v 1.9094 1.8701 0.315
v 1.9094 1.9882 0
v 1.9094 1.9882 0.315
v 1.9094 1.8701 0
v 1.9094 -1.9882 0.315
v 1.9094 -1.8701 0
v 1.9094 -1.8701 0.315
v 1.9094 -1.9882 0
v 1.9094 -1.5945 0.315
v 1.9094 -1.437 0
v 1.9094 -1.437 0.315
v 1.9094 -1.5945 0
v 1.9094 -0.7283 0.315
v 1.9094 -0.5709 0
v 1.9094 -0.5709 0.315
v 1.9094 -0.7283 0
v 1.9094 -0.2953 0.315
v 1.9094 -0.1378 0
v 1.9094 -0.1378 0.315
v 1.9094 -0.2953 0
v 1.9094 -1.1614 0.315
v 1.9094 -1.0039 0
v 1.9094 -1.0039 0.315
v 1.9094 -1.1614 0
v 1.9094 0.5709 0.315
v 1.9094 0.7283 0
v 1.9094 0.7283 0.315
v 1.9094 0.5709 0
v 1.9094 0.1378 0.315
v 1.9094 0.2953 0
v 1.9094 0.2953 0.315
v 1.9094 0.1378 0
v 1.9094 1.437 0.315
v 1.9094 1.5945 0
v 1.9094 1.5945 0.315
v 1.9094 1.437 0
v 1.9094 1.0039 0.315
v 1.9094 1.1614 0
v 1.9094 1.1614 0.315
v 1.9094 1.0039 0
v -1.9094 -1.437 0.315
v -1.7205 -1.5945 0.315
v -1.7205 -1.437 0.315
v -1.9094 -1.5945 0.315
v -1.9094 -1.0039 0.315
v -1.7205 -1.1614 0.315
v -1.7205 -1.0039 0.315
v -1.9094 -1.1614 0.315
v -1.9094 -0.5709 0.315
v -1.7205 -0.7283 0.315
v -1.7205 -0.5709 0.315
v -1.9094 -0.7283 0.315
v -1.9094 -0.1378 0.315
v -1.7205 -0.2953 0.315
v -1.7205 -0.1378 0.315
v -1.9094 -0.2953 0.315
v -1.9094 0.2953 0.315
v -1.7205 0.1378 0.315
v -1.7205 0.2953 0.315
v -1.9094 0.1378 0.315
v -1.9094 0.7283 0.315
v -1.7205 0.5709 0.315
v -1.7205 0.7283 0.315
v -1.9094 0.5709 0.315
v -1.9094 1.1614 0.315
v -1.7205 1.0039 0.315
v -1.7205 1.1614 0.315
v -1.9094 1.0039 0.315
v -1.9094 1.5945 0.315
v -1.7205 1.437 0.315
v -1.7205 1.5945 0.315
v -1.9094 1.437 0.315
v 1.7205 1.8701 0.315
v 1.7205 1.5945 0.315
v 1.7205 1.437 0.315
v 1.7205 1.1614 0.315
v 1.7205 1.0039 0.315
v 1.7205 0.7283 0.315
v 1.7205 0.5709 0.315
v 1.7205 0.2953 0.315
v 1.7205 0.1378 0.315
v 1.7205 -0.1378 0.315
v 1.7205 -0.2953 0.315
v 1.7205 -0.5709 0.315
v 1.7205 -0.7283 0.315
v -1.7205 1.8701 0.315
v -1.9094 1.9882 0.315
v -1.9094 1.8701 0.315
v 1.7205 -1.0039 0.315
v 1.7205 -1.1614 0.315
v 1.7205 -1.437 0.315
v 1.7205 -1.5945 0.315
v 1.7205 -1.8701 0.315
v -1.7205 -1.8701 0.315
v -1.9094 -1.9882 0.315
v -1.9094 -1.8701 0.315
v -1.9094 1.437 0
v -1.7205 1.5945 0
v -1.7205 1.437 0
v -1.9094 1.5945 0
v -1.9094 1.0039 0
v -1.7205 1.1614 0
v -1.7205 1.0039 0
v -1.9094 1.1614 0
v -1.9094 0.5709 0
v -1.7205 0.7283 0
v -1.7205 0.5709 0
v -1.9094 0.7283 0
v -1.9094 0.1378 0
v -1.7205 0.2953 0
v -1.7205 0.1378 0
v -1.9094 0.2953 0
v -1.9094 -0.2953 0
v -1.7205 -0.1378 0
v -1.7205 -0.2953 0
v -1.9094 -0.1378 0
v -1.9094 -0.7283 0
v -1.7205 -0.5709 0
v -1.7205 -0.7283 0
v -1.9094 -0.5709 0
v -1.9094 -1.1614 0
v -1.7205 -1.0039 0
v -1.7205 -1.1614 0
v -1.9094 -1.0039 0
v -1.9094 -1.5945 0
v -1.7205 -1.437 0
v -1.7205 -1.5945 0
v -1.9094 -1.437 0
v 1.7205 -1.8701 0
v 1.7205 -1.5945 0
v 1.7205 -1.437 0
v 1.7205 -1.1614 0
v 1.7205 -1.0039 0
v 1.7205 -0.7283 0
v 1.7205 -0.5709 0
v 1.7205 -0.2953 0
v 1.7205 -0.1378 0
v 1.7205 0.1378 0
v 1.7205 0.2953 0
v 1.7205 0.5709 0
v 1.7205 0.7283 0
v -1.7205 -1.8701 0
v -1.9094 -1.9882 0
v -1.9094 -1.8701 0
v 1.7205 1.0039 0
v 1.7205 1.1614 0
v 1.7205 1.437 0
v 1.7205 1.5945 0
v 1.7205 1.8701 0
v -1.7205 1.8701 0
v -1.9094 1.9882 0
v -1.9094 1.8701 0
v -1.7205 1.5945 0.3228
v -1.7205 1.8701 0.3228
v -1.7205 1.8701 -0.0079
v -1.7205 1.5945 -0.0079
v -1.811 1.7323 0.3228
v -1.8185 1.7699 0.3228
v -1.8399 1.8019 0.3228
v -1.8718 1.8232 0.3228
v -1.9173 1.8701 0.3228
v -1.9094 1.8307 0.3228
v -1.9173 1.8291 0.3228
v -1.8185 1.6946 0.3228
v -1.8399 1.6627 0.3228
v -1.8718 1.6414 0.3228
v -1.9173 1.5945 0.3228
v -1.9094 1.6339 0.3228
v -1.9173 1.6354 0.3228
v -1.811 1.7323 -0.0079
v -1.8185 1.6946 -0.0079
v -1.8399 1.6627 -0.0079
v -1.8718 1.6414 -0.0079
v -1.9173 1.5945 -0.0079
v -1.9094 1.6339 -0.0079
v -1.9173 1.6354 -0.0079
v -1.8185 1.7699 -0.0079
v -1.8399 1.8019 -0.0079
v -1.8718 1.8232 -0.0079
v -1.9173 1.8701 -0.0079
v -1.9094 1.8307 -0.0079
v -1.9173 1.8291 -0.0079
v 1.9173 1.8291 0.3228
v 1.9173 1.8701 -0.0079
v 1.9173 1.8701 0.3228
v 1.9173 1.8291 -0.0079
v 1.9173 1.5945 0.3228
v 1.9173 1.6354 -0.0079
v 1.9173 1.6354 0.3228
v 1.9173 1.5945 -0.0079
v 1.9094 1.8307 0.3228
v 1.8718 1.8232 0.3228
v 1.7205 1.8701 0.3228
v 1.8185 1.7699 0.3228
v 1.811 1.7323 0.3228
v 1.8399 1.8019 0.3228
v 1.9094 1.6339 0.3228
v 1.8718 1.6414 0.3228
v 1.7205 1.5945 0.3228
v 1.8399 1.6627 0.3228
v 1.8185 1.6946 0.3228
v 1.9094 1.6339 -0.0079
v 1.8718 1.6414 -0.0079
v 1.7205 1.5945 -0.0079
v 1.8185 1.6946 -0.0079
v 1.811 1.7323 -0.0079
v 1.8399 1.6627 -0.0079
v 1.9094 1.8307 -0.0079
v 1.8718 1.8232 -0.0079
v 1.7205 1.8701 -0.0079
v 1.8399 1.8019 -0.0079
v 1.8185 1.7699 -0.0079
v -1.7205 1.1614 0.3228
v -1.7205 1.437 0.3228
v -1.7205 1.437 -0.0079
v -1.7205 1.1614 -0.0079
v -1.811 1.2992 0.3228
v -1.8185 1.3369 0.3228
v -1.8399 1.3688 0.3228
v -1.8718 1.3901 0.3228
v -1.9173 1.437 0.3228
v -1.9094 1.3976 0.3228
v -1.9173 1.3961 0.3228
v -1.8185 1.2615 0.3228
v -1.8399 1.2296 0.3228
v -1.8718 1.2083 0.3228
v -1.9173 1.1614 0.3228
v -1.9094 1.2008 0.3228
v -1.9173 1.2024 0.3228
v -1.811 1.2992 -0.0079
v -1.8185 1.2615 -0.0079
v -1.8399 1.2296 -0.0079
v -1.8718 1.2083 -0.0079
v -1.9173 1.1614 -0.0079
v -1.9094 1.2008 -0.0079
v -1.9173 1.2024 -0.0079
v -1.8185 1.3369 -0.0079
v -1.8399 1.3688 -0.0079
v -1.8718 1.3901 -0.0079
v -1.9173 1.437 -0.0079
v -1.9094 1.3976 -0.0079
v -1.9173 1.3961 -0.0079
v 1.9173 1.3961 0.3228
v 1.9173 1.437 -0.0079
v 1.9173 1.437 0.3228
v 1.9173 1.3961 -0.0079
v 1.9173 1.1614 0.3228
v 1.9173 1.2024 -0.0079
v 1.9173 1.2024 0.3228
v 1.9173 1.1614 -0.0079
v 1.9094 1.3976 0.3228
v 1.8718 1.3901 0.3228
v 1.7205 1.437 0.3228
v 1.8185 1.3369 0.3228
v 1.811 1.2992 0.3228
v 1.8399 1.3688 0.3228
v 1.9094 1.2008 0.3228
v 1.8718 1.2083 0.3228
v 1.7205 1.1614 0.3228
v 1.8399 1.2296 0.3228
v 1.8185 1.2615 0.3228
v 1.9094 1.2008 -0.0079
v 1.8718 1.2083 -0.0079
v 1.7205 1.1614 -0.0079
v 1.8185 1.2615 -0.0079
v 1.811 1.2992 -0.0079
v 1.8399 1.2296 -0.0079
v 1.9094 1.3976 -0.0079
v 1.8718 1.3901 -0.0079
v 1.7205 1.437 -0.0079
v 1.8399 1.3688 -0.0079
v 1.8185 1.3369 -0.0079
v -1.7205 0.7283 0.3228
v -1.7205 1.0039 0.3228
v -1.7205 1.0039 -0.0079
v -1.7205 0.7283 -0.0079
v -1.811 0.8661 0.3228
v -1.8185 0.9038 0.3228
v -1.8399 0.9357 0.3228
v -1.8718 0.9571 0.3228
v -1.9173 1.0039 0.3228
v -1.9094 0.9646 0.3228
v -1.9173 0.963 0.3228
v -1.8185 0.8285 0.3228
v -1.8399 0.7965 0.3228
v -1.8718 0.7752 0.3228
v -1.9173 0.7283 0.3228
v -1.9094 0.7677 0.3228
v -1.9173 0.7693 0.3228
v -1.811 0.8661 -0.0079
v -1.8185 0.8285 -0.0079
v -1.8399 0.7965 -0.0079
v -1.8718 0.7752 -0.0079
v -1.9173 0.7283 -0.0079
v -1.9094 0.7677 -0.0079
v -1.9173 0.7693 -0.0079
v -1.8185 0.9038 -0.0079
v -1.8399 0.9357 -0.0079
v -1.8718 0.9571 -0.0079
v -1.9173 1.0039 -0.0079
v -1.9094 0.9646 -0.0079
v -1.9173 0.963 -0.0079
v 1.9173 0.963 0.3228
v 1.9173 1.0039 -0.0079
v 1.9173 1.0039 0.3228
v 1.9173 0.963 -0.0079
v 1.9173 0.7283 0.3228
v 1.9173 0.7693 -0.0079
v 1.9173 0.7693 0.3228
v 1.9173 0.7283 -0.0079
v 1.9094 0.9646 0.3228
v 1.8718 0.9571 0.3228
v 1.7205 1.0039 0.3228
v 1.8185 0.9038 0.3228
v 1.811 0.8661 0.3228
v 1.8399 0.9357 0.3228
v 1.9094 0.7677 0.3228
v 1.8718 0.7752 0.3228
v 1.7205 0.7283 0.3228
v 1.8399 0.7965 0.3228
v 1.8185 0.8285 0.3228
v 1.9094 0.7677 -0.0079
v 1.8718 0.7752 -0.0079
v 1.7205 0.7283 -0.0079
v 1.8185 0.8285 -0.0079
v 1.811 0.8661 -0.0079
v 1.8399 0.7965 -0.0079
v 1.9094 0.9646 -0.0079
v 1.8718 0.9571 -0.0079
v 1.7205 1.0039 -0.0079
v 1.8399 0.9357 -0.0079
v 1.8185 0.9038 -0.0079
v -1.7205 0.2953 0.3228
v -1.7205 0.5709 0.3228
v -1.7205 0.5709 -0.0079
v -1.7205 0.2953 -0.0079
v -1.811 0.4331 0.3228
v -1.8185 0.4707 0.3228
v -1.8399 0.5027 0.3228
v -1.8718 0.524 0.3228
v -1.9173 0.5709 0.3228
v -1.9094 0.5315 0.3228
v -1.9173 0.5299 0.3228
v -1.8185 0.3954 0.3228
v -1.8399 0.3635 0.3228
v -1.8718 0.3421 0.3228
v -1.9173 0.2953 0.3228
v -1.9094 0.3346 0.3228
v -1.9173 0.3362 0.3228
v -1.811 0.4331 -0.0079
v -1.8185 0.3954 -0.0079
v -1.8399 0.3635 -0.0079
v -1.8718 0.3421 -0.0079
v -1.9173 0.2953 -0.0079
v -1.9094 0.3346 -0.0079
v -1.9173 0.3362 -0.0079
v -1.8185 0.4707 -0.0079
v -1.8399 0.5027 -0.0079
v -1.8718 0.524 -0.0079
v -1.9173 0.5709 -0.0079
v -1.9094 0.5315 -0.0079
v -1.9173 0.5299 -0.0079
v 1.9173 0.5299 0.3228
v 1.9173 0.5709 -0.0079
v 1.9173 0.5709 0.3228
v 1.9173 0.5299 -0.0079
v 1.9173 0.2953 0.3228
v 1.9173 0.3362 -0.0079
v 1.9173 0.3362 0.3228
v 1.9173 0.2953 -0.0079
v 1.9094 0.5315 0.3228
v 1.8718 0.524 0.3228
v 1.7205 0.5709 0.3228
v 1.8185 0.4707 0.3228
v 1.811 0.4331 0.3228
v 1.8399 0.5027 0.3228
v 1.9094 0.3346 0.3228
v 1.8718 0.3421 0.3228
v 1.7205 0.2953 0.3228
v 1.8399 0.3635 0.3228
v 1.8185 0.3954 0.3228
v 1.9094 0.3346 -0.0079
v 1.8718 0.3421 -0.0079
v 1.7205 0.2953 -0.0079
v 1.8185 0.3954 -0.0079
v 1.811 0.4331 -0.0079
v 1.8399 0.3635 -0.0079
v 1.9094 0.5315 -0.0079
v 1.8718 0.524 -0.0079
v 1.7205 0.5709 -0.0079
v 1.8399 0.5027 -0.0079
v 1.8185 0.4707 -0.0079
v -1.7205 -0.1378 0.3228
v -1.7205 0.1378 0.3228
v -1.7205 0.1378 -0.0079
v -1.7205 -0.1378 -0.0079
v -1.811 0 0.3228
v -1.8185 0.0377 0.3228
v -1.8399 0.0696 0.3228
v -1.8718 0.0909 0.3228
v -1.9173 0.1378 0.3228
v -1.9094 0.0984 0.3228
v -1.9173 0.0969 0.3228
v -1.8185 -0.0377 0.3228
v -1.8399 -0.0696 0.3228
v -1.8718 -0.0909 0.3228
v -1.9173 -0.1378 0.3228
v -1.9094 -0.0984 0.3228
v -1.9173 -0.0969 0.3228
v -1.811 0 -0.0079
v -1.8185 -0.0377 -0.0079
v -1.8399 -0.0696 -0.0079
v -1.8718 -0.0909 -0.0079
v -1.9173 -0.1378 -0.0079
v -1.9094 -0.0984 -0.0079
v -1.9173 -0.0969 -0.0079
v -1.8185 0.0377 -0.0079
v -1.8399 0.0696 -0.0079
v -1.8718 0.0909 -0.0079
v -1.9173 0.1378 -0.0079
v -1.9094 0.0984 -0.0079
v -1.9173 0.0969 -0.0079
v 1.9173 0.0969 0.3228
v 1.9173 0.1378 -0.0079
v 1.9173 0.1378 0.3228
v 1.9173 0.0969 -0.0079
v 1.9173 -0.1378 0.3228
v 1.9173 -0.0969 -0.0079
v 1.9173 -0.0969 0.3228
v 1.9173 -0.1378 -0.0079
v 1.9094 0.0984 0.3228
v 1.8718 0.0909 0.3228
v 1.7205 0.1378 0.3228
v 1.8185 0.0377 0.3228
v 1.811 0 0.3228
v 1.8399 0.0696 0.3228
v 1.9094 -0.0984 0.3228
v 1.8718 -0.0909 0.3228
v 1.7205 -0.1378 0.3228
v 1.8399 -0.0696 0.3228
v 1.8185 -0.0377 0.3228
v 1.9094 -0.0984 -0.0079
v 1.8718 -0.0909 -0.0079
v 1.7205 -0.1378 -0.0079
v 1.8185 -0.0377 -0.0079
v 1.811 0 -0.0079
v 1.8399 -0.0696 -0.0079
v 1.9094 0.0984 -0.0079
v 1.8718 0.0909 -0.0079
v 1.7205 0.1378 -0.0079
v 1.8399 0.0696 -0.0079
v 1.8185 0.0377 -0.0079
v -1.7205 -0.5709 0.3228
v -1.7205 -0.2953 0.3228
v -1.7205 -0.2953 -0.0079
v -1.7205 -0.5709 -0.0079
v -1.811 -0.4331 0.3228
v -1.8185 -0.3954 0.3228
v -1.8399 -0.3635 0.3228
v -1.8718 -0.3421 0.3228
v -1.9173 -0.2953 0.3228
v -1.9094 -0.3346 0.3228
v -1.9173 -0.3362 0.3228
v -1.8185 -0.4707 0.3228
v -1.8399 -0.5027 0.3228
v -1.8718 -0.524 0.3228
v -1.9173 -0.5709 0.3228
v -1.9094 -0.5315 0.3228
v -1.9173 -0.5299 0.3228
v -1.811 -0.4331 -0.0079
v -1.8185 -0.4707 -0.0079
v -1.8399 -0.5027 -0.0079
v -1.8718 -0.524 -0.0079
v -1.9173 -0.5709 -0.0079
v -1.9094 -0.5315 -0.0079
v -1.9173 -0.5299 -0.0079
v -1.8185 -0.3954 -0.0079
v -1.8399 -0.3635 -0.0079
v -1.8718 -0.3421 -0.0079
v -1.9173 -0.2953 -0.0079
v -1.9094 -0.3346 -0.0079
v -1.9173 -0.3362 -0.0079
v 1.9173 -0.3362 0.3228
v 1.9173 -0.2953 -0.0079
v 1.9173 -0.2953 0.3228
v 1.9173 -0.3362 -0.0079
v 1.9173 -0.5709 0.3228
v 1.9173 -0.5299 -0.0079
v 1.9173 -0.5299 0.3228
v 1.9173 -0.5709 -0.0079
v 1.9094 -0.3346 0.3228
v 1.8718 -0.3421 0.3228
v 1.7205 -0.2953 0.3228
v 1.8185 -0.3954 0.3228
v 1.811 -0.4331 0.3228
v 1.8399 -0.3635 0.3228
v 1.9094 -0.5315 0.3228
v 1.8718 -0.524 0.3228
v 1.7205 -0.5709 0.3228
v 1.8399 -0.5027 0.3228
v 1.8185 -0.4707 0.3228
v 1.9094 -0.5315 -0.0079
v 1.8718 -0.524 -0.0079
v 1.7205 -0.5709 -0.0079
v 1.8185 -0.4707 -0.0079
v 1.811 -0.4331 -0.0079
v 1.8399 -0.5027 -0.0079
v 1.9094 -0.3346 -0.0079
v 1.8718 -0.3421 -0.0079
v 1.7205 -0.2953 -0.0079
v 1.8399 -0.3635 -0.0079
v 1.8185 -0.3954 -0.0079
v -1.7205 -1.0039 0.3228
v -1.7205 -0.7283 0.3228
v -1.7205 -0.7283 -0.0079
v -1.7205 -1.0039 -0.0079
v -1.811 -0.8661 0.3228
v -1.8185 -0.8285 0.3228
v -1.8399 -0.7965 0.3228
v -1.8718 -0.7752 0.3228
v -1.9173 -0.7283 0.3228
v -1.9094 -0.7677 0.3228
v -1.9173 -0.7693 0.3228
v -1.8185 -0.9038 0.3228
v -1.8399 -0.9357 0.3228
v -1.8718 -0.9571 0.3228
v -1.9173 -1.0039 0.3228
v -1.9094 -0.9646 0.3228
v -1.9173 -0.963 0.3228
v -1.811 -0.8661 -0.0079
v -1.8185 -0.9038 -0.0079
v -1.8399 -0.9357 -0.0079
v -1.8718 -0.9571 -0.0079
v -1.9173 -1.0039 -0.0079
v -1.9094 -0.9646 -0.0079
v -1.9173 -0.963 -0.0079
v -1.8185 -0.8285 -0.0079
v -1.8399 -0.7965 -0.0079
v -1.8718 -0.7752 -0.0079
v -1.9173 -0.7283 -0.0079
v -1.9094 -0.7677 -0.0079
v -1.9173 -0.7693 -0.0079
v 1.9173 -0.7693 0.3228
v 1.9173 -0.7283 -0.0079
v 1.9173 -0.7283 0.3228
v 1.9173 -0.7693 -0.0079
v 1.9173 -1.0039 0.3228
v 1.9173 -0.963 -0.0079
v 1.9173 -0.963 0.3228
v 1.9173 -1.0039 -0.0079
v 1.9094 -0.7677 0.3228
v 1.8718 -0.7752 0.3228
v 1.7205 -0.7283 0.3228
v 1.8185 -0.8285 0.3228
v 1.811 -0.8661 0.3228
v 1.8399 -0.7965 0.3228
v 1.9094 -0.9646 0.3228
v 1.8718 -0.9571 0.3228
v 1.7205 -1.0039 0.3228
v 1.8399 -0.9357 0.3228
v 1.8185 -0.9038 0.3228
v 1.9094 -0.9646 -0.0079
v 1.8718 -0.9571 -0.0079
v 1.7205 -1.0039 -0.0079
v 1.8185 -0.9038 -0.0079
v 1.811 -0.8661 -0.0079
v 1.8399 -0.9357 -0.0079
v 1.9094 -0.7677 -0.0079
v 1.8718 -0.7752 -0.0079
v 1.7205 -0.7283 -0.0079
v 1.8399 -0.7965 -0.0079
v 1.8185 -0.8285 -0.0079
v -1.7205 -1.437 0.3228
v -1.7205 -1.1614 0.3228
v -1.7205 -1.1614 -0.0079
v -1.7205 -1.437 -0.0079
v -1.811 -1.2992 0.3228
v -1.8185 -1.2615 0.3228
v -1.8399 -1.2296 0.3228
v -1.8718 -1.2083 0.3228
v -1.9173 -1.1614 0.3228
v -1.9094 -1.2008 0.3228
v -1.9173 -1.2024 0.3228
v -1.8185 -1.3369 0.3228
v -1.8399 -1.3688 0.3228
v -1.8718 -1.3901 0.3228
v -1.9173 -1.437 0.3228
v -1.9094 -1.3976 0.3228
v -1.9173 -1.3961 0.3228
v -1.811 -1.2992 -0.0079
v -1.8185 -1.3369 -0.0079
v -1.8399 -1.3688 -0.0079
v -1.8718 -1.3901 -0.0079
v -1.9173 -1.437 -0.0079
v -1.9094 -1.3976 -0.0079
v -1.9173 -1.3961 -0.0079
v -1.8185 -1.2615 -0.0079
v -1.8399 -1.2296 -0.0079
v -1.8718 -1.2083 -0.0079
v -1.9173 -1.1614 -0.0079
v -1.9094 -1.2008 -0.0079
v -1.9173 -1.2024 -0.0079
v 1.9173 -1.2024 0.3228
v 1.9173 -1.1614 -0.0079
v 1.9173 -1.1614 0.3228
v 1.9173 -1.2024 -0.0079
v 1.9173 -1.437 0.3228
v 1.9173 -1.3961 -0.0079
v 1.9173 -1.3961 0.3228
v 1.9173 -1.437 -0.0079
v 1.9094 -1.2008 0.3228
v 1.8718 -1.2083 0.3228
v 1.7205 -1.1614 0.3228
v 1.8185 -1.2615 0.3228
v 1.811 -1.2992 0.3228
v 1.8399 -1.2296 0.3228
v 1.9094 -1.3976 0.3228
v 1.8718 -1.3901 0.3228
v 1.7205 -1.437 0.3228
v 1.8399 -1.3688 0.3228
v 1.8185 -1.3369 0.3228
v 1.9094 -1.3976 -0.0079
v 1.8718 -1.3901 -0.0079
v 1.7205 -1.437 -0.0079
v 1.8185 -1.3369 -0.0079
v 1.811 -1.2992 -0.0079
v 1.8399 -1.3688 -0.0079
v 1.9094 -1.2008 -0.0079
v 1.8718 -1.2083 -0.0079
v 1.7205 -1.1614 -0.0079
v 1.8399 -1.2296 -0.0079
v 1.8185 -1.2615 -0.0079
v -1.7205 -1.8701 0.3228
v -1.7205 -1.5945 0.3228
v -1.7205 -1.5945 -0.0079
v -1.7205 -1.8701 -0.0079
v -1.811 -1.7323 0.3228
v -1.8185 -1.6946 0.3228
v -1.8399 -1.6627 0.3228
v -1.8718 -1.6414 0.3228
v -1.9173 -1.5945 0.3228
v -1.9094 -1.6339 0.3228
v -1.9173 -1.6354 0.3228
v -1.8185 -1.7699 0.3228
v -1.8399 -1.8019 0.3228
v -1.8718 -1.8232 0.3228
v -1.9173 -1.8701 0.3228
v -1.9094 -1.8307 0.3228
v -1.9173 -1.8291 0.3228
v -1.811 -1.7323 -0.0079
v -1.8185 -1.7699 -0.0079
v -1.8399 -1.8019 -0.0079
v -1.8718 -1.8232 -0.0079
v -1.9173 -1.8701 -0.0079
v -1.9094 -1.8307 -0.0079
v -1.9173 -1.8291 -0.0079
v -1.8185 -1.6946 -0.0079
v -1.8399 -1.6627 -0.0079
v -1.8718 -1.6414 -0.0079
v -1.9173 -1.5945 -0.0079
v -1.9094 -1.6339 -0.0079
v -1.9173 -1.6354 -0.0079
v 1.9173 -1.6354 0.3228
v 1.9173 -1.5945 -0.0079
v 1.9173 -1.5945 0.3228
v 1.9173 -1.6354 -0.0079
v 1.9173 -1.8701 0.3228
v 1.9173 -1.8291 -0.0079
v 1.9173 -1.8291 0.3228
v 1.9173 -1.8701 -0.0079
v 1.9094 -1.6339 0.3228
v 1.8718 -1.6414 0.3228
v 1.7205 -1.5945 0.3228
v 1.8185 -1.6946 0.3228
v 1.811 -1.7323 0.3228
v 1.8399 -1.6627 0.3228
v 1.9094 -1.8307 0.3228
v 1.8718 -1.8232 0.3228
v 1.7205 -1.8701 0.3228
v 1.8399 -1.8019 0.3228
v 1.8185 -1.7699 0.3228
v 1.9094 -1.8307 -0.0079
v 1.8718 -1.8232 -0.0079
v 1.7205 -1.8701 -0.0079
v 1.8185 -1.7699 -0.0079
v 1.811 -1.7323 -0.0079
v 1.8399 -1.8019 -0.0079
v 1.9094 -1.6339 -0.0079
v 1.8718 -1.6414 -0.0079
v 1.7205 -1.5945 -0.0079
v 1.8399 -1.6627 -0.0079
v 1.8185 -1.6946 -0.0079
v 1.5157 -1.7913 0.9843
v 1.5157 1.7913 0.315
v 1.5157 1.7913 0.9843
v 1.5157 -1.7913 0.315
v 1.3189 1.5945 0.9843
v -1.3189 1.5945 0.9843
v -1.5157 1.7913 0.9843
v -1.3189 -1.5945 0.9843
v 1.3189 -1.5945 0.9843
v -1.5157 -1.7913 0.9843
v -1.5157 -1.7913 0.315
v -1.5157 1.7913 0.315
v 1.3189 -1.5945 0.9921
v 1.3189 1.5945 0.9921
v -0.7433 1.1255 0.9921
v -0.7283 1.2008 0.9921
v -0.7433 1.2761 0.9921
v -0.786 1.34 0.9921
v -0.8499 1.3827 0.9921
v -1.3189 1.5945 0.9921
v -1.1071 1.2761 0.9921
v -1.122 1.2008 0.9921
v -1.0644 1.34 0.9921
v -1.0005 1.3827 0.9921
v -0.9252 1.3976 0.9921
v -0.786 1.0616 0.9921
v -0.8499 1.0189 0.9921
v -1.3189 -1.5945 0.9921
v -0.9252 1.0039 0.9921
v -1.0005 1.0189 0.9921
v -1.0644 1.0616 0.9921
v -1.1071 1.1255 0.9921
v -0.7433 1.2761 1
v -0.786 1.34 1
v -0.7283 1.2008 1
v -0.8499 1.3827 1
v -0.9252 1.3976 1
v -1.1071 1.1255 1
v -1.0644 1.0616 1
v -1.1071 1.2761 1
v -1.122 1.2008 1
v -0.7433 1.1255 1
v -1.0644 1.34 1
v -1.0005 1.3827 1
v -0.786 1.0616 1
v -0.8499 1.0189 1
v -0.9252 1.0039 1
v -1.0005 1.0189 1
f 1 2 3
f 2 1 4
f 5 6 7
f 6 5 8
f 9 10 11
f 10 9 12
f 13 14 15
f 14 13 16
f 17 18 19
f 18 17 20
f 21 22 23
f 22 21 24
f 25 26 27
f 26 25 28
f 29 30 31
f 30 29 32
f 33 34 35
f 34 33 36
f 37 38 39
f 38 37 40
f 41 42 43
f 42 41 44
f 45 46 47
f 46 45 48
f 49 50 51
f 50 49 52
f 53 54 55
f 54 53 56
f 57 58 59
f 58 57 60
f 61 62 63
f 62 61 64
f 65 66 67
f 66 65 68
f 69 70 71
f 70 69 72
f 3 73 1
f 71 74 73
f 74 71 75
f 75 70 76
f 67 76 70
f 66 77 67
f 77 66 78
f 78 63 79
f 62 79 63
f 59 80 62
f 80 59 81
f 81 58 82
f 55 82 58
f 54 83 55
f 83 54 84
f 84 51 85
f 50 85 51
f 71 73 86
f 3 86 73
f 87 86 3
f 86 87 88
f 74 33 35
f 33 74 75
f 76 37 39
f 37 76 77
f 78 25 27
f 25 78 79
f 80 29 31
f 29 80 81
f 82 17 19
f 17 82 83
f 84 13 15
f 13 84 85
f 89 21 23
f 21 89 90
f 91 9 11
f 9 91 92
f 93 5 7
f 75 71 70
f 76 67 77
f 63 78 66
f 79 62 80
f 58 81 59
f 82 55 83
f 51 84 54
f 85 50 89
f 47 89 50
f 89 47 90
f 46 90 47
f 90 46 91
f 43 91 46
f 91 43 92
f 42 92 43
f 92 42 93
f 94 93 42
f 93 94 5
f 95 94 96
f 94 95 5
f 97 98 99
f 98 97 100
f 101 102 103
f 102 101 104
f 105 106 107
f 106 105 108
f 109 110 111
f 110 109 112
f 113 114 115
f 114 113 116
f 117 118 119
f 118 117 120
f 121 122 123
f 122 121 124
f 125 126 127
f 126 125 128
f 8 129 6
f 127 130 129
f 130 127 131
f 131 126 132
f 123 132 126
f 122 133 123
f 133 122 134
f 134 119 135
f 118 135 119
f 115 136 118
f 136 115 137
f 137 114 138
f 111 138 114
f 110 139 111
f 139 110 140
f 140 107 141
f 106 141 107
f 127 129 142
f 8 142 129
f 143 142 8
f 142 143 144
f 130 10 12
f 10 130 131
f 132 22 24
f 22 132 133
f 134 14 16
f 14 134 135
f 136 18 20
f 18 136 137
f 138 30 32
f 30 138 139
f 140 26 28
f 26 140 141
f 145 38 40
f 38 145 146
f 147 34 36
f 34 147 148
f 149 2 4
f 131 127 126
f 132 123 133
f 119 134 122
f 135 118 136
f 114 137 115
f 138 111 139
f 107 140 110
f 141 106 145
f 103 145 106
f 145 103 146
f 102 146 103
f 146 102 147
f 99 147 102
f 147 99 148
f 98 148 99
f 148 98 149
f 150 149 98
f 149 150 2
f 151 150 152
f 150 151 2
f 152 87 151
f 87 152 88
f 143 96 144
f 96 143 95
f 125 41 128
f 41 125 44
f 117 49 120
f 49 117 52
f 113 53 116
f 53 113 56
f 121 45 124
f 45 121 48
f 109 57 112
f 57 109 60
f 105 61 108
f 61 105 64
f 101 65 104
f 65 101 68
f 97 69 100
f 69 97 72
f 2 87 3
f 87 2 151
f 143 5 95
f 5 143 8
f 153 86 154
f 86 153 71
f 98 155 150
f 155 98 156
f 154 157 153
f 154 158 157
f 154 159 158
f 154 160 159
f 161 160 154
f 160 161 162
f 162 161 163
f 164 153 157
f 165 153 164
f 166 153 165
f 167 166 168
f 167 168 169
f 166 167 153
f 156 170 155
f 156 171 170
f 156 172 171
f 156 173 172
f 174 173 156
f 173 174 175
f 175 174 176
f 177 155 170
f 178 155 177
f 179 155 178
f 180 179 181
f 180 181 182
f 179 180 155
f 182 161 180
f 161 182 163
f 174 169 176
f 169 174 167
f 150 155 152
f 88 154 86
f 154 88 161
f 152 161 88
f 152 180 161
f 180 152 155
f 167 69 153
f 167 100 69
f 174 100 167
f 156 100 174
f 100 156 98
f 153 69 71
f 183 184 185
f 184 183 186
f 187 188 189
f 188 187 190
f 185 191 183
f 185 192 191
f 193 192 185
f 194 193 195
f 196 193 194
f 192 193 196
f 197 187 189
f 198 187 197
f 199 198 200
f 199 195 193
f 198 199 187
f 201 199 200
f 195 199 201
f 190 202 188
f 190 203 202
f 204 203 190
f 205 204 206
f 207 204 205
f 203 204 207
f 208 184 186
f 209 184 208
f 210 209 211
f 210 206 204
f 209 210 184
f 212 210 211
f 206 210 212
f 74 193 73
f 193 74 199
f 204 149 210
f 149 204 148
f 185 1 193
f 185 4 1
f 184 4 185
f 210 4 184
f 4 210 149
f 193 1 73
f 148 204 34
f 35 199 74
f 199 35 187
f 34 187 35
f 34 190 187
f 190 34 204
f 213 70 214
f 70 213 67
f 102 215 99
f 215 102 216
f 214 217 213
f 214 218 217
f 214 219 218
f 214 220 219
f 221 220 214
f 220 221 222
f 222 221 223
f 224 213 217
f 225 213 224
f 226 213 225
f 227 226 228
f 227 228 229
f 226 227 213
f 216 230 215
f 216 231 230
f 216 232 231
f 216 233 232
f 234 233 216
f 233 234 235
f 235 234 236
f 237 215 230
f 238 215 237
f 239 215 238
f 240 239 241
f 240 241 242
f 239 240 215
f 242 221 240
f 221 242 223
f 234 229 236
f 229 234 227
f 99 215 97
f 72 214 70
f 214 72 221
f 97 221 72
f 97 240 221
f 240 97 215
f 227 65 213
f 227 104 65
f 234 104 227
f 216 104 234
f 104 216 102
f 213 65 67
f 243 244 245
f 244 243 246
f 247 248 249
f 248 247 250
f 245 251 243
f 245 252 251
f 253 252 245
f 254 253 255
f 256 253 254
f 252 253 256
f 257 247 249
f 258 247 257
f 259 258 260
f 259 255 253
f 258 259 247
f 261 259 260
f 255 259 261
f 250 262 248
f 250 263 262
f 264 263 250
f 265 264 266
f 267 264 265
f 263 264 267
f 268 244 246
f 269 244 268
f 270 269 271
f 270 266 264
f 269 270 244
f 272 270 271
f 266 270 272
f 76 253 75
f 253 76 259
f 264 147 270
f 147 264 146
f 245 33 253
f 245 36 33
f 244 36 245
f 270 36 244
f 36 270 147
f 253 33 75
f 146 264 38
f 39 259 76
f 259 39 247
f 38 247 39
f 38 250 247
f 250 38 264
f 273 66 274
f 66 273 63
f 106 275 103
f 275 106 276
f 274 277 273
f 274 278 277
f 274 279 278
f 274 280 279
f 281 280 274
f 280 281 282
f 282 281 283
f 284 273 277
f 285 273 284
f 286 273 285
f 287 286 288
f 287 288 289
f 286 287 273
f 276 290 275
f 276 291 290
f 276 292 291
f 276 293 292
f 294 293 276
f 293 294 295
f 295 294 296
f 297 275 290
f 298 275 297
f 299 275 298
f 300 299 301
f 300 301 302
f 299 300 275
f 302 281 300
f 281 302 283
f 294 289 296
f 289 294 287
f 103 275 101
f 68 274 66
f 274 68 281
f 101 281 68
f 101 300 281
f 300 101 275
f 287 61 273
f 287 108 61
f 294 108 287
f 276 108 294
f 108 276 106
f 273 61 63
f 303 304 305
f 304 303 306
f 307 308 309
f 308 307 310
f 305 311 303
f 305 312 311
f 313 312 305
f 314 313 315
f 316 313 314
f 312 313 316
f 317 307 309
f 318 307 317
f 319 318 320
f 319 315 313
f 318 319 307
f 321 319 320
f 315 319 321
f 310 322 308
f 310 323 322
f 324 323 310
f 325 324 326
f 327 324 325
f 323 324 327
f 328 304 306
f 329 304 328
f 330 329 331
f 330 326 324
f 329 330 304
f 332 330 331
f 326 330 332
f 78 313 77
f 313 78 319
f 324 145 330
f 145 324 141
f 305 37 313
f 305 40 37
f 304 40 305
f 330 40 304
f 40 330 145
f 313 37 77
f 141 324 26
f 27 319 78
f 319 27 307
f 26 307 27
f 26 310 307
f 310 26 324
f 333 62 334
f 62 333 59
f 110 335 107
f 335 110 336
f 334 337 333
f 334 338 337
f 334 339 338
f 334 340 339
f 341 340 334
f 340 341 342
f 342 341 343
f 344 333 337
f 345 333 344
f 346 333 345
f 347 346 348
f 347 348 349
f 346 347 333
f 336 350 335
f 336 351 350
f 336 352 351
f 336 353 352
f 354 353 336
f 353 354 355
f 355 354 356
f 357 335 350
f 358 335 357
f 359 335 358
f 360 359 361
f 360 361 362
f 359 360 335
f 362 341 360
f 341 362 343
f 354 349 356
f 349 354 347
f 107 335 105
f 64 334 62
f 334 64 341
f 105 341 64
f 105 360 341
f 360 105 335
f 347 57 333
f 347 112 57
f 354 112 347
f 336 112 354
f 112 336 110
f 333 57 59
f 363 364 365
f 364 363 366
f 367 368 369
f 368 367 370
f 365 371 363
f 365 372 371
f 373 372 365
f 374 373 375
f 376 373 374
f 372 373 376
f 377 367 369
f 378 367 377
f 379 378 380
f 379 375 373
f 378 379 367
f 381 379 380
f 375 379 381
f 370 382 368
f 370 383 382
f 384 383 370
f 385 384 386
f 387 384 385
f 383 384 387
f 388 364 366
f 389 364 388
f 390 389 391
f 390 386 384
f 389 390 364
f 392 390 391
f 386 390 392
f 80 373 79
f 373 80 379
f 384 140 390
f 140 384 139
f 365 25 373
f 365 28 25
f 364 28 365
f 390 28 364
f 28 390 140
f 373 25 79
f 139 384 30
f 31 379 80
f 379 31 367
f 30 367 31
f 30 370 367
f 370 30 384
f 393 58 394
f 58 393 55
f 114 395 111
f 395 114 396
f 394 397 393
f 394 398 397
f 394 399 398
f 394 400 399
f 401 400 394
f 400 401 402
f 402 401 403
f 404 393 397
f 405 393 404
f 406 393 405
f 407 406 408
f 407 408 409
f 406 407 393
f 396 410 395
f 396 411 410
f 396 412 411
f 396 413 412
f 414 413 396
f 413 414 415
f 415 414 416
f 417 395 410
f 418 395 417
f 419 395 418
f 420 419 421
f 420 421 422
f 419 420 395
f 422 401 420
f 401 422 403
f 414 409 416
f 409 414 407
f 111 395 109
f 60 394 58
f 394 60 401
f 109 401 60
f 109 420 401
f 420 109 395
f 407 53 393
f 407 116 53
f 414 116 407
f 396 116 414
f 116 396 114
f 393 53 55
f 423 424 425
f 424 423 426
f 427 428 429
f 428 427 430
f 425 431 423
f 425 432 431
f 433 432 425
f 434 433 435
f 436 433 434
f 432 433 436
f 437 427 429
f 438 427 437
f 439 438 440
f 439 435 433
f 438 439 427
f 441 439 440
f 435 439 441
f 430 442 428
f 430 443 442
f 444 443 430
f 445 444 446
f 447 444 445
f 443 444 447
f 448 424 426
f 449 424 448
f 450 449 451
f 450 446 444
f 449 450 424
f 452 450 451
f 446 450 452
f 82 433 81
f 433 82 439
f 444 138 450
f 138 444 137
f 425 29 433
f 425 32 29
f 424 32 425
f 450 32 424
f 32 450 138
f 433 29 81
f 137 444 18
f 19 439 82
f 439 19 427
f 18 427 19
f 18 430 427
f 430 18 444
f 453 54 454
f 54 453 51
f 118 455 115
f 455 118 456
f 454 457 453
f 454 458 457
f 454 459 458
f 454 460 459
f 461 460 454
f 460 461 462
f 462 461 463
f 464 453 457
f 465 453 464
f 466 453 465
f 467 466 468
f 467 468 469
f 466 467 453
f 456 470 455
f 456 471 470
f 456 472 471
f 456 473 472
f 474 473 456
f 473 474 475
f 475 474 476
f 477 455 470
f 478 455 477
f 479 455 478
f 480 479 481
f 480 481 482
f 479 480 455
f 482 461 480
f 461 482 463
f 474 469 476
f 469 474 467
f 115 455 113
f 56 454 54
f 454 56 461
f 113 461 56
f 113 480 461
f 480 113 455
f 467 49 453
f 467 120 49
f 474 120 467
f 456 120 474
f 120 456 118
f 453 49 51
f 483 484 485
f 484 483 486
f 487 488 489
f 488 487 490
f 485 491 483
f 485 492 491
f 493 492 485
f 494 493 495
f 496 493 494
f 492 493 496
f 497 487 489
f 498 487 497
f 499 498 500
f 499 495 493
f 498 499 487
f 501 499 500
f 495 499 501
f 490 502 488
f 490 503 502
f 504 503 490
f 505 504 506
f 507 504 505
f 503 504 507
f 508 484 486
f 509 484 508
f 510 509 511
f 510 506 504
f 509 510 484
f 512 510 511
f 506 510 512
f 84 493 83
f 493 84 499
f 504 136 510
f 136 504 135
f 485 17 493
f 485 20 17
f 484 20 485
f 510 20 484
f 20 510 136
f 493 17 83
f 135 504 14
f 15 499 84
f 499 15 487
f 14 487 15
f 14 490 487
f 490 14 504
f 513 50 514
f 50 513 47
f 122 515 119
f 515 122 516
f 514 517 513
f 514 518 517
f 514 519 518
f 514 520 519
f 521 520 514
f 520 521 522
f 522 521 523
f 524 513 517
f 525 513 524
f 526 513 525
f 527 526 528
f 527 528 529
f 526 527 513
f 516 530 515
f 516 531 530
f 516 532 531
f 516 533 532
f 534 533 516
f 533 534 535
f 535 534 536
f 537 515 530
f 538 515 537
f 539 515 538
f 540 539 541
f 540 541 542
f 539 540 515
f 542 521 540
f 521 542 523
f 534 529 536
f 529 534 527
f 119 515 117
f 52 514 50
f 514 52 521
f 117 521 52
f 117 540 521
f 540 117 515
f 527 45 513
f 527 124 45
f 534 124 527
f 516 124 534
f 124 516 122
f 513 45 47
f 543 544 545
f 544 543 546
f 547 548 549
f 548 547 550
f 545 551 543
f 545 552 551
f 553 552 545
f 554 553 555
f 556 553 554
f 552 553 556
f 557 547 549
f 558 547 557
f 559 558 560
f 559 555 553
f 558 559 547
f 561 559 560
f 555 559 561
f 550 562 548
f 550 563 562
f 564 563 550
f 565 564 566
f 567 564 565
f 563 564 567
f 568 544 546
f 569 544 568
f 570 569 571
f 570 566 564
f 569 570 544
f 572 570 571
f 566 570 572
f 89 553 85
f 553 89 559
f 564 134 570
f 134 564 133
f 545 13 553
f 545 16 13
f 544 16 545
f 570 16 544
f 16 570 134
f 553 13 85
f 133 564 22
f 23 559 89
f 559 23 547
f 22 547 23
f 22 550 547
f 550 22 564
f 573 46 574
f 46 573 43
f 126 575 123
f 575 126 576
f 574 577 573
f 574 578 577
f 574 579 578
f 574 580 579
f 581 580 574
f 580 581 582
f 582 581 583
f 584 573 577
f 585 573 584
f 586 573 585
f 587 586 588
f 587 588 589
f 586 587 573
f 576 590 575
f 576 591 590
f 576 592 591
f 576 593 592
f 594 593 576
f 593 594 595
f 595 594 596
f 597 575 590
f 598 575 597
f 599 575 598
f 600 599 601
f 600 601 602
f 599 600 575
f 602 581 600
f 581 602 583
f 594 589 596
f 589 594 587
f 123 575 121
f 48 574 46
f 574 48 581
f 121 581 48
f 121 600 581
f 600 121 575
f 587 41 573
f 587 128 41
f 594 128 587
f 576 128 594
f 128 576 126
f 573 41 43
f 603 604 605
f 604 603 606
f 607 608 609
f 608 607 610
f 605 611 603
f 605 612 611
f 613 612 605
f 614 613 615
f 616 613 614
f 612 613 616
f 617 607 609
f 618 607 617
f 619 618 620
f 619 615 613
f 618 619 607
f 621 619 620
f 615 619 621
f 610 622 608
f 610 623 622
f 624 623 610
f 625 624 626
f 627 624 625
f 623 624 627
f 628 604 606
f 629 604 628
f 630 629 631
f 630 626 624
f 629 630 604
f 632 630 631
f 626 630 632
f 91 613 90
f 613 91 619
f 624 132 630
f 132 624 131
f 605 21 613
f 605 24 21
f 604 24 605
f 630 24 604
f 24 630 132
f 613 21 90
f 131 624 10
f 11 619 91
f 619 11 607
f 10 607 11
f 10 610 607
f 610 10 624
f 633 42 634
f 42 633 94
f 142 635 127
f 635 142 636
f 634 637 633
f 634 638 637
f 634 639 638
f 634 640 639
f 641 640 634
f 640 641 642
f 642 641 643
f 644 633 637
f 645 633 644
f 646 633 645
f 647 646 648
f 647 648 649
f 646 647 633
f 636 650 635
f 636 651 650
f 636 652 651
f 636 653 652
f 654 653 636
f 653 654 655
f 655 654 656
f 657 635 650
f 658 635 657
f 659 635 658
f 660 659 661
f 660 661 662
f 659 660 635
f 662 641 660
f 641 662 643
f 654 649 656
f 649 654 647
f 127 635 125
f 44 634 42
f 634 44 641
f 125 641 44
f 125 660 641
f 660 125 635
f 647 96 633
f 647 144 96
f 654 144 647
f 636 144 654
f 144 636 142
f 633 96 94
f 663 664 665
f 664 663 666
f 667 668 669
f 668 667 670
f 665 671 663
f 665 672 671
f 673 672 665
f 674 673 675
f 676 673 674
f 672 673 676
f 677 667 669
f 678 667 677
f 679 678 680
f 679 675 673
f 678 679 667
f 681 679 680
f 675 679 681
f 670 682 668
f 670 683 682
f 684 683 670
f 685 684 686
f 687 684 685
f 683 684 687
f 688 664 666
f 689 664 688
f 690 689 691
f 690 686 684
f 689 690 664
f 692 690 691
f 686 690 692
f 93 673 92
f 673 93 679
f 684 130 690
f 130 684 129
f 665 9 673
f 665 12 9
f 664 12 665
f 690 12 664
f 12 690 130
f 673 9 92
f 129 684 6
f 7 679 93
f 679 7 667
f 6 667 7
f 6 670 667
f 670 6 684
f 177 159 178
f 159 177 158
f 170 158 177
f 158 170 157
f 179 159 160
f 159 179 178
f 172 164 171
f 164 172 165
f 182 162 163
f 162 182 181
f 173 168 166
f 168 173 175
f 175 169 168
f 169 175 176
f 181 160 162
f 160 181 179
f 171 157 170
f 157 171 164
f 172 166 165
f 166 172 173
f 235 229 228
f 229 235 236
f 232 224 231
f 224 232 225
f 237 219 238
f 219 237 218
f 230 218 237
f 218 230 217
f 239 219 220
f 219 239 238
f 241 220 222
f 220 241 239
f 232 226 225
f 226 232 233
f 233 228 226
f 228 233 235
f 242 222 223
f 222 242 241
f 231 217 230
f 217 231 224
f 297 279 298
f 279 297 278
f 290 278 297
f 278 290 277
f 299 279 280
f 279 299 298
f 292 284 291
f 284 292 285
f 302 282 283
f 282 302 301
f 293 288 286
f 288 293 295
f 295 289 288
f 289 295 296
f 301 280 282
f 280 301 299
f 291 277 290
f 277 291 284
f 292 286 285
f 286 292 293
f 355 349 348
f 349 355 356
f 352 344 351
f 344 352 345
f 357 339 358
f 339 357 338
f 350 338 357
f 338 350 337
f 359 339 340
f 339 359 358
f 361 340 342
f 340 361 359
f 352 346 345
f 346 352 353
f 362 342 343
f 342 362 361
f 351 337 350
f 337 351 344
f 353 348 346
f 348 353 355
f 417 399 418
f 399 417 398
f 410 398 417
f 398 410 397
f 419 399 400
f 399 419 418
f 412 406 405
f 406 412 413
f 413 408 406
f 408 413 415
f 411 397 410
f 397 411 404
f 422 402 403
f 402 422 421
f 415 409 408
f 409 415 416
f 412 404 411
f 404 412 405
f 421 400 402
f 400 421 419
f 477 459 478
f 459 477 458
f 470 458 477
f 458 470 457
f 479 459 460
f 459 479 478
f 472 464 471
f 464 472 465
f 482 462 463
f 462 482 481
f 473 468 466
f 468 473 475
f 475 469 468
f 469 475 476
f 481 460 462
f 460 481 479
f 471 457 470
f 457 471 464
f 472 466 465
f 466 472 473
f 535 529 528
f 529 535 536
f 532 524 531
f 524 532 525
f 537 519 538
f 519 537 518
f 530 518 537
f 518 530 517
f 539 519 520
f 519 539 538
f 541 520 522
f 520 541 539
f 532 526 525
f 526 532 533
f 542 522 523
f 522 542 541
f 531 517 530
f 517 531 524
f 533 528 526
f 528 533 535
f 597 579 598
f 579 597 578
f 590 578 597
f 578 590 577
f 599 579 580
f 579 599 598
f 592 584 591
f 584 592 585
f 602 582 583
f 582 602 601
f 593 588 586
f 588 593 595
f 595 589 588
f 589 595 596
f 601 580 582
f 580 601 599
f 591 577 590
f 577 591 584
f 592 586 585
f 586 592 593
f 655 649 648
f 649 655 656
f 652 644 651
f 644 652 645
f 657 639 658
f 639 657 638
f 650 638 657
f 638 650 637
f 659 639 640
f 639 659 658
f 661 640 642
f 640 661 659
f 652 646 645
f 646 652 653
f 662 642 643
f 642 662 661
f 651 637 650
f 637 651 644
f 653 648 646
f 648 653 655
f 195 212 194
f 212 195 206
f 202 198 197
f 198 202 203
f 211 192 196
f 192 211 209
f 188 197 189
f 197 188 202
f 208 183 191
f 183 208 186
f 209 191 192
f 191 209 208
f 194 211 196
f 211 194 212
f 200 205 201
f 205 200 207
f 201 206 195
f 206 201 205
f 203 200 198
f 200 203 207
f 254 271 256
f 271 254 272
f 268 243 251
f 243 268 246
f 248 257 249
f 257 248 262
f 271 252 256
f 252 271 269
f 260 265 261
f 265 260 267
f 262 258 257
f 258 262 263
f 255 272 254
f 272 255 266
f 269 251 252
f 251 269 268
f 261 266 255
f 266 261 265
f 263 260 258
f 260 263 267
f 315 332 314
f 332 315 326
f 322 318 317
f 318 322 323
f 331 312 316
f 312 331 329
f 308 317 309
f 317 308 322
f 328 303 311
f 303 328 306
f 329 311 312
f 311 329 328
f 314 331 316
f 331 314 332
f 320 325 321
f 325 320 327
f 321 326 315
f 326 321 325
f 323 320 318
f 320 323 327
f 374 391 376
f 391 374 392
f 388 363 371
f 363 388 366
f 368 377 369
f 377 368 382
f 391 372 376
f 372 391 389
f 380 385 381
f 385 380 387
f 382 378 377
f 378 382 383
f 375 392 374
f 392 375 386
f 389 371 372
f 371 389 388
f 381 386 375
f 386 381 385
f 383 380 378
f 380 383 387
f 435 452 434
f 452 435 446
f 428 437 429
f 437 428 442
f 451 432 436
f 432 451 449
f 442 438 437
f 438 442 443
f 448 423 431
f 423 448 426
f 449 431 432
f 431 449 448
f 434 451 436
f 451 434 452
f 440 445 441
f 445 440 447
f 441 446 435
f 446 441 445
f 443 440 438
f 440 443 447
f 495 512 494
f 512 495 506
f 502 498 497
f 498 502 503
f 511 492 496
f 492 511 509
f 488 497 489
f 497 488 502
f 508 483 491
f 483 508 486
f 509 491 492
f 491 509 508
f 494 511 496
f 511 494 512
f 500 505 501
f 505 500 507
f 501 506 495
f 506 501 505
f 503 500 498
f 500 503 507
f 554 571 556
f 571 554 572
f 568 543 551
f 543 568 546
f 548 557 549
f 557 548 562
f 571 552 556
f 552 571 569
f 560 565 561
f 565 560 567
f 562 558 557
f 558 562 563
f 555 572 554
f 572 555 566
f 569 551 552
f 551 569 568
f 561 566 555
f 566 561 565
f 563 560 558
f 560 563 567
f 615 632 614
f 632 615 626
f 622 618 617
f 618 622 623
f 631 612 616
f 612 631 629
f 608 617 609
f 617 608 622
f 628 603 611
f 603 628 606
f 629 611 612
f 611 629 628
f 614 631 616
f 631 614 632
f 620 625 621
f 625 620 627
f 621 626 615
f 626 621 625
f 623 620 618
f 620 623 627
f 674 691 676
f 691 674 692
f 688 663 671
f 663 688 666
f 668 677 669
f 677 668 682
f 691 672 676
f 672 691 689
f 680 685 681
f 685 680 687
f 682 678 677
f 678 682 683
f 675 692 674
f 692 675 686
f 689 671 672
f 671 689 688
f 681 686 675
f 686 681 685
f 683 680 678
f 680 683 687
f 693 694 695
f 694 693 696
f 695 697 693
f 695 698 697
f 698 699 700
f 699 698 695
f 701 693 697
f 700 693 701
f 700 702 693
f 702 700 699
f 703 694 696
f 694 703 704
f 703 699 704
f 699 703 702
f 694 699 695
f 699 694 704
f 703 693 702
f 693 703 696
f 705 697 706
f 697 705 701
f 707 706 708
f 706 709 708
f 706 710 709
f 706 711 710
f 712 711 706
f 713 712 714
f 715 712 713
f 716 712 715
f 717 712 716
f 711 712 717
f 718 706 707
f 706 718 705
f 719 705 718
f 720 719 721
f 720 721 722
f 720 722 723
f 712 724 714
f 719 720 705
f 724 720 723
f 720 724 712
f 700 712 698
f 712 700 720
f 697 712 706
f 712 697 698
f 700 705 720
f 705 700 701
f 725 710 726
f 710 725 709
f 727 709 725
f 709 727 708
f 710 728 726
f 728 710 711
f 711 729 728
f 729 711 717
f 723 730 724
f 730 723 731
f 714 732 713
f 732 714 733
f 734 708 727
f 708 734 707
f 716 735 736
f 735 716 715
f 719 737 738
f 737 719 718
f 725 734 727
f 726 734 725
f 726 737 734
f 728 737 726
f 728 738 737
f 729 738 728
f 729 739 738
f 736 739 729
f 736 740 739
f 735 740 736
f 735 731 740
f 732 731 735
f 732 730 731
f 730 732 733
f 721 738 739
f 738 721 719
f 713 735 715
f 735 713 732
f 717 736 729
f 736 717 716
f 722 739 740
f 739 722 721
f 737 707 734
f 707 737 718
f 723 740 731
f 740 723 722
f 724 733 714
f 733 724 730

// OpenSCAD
// file: defines.scad
w = 9.7;
h = 10.10;
t = 2.5;
pcb_t = 0.8;
pin_fragments = 16;

scale = 1/2.54;
// file: SIM68M-pin1.scad
// example012.stl is Mblock.stl, (c) 2009 Will Langford
// licensed under the Creative Commons - GNU GPL license.
// http://www.thingiverse.com/thing:753

//import("sim800c.stl", convexity=3);

// PCB

include <defines.scad>

color("Red")
  scale(scale)
  translate([-w/2 + 2.5,  h/2 - 2.0, t+0.02])
    cylinder(r = 0.5, h = 0.02, $fn = 16);
// file: SIM68M-label.scad
include <defines.scad>

lw = w - 3.0;
lh = h - 2.0;

/*color("White")
  translate([-w/2 + 0.25,   h/2 - 2.25,  0.8])
    cube(size = [2.5, 2, 0.02], center = false);*/

// Label

color("White")
  scale(scale)
  translate([-lw/2, -lh/2, t])
    cube(size = [lw, lh, 0.02], center = false);
// file: SIM68M-shield.scad
// example012.stl is Mblock.stl, (c) 2009 Will Langford
// licensed under the Creative Commons - GNU GPL license.
// http://www.thingiverse.com/thing:753

//import("sim800c.stl", convexity=3);

// PCB

include <defines.scad>

// SHIELD

sw = w - 2.0;
sh = h - 1.0;

color("Silver")
  scale(scale)
  translate([-sw/2, -sh/2, pcb_t])
    cube(size = [sw, sh, t - pcb_t], center = false);
// file: SIM68M-pins.scad
// example012.stl is Mblock.stl, (c) 2009 Will Langford
// licensed under the Creative Commons - GNU GPL license.
// http://www.thingiverse.com/thing:753

//import("sim800c.stl", convexity=3);

// PCB

include <defines.scad>

// Pin drill

module Pin(o_x, o_y, d_x, d_y, cnt) {
  color("Gold")
  for(i = [0 : cnt-1]) {
    translate([o_x + i * d_x, o_y + i * d_y, -0.5])
      cylinder(h = 2, r = 0.25, $fn = pin_fragments);
  }
}

module PinDrills() {
    Pin(-w/2, h/2 - 0.65, 0, -1.1, 9);
    Pin( w/2, h/2 - 0.65, 0, -1.1, 9);
}

// Combine together

scale(scale)
difference() {
  union() {
      for(i = [0 : 8]) {
        translate([-w/2-0.02, h/2 - 0.65 - 0.35 - i * 1.1, -0.02])
          cube(size = [0.5, 0.7, 0.84]);
        translate([ w/2+0.02-0.5, h/2 - 0.65 - 0.35 - i * 1.1, -0.02])
          cube(size = [0.5, 0.7, 0.84]);
      }
  }
  PinDrills();
}
// file: SIM68M-pcb.scad
include <defines.scad>

// Pcb

module Pcb() {
  color("Green")
  translate([-w/2, -h/2])
    cube(size = [w, h, pcb_t], center = false);

}

// Pin drill

module PadPin(o_x, o_y, d_x, d_y, cnt) {
  color("Red")
  for(i = [0 : cnt-1]) {
    translate([o_x + i * d_x, o_y + i * d_y, -0.5])
      cylinder(h = 2, r = 0.30, $fn = pin_fragments);
  }
}

module PadDrills() {
    PadPin(-w/2, h/2 - 0.65, 0, -1.1, 12);
    PadPin( w/2, h/2 - 0.65, 0, -1.1, 12);
}

// Combine together

/*Pcb();*/
scale(scale)
difference() {
  union() {
    Pcb();
  }

	PadDrills();
}
// main file
// example012.stl is Mblock.stl, (c) 2009 Will Langford
// licensed under the Creative Commons - GNU GPL license.
// http://www.thingiverse.com/thing:753

//import("sim800c.stl", convexity=3);

// PCB

include <SIM68M-pcb.scad>
include <SIM68M-pins.scad>
include <SIM68M-shield.scad>
include <SIM68M-label.scad>
include <SIM68M-pin1.scad>
